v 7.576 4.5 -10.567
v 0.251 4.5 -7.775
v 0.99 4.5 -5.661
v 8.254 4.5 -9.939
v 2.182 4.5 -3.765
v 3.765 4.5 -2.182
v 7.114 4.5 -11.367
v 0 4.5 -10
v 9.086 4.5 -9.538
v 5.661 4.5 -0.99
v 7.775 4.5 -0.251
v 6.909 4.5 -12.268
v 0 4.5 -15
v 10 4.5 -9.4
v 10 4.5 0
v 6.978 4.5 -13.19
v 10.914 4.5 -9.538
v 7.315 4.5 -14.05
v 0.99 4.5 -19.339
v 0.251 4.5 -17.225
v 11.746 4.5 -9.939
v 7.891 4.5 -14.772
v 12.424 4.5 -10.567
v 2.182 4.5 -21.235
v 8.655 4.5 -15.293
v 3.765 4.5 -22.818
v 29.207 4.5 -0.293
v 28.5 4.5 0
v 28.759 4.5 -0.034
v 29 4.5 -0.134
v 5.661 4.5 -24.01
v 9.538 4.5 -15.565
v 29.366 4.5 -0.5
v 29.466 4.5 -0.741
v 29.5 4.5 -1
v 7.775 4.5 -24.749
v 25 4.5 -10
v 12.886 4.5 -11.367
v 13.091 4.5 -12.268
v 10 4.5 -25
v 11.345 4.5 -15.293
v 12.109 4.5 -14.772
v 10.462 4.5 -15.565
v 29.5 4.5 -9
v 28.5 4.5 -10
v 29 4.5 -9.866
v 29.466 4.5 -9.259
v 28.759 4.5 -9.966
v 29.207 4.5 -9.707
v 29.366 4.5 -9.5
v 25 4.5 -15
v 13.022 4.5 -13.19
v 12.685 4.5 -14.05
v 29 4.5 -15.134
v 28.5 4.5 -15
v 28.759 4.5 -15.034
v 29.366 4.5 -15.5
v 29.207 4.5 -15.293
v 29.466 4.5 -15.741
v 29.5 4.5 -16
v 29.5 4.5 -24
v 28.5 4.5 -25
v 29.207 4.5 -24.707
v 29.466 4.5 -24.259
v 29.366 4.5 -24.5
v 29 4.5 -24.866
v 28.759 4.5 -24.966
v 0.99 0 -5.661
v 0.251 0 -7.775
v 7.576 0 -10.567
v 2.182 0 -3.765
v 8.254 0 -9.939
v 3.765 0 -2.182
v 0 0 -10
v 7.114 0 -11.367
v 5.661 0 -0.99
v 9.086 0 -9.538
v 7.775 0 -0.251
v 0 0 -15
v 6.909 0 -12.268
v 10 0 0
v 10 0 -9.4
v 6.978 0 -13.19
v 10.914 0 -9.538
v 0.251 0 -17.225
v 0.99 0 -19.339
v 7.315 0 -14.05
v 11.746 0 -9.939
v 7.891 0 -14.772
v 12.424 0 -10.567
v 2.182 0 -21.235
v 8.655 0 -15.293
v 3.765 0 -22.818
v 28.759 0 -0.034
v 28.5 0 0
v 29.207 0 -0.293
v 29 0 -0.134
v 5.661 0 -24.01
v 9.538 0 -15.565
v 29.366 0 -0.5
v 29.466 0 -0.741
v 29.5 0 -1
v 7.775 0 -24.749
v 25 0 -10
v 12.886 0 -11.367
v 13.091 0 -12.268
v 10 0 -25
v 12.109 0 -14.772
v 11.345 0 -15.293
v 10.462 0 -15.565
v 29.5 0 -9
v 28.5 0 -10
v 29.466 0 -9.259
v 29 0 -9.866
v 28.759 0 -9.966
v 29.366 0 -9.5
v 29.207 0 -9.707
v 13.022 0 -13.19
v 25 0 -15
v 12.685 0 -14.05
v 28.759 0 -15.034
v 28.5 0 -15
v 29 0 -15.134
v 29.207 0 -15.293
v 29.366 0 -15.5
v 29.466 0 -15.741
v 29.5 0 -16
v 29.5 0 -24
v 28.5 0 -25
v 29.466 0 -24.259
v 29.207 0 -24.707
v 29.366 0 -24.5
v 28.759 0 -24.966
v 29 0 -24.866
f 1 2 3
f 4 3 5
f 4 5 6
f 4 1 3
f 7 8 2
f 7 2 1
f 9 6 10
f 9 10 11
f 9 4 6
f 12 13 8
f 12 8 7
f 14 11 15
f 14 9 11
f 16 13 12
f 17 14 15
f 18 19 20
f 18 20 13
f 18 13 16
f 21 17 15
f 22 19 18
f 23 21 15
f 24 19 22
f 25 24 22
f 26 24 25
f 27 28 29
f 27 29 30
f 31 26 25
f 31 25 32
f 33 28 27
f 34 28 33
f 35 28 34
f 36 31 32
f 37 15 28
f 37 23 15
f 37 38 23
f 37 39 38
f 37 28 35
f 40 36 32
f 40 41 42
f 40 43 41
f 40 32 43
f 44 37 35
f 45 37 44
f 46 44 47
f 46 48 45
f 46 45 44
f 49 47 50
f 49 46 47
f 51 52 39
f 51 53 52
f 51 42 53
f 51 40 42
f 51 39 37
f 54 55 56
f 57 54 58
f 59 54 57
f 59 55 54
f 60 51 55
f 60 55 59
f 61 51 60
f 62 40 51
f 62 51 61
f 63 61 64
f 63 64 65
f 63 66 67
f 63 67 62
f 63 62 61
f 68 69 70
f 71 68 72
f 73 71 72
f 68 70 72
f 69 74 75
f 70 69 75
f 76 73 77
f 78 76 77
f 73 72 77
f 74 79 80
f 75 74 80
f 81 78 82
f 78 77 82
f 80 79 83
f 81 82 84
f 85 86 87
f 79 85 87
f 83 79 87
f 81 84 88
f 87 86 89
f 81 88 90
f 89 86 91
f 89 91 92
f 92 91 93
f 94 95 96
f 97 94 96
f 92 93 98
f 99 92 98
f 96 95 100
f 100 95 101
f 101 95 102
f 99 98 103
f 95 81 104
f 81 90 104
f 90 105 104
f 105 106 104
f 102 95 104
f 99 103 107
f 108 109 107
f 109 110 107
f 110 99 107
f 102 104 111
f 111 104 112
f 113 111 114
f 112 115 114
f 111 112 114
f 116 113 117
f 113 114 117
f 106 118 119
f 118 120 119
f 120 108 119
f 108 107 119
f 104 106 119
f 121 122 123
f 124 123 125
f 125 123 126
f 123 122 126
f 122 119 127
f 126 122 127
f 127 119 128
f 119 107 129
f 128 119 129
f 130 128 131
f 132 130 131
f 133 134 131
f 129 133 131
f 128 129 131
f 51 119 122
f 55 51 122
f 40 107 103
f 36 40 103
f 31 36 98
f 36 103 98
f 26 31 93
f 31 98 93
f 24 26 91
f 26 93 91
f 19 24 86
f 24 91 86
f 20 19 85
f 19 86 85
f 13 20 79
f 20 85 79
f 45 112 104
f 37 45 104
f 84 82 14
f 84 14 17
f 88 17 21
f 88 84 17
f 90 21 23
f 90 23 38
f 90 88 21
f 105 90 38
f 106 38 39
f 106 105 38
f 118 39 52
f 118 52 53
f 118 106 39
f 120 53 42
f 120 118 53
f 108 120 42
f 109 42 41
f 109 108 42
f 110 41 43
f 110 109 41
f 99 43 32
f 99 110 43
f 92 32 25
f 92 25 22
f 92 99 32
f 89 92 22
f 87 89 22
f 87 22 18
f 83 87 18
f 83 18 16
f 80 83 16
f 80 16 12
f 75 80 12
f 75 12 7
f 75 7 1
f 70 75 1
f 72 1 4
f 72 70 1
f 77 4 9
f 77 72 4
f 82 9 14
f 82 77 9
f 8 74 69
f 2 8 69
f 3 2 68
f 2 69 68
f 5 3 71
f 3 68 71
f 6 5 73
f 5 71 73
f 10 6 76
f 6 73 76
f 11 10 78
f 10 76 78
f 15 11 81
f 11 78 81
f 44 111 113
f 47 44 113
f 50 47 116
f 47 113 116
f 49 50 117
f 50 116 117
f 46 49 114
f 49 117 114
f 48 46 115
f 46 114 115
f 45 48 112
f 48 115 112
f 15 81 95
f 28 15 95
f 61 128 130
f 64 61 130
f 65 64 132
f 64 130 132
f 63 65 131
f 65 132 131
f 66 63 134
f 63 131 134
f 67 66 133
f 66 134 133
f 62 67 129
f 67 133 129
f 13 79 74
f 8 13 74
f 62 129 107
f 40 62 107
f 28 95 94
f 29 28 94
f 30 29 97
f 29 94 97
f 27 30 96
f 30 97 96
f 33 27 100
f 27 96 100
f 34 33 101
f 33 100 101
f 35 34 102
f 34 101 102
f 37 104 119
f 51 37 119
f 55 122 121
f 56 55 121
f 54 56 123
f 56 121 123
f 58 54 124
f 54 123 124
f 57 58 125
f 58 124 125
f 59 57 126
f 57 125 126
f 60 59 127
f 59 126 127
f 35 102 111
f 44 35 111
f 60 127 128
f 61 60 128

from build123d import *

# Parameters (mm, degrees)
SKETCH1_R           = 3.1
BOSS_EXTRUDE1_DEPTH = 4.5


with BuildPart() as part:
    # Sketch1 → Boss-Extrude1 (new body)
    with BuildSketch(Plane(origin=(0, 0, 0), x_dir=(1, 0, 0), z_dir=(0, 1, 0))):
        with BuildLine():
            Line((10, 0), (25, 0))
            Line((25, 0), (28.5, 0))
            ThreePointArc((28.5, 0), (29.207106781, 0.292893219), (29.5, 1))
            Line((29.5, 1), (29.5, 9))
            ThreePointArc((29.5, 9), (29.207106781, 9.707106781), (28.5, 10))
            Line((28.5, 10), (25, 10))
            Line((25, 10), (25, 15))
            Line((25, 15), (28.5, 15))
            ThreePointArc((28.5, 15), (29.207106781, 15.292893219), (29.5, 16))
            Line((29.5, 16), (29.5, 24))
            ThreePointArc((29.5, 24), (29.207106781, 24.707106781), (28.5, 25))
            Line((28.5, 25), (25, 25))
            Line((25, 25), (10, 25))
            ThreePointArc((10, 25), (2.928932188, 22.071067812), (0, 15))
            Line((0, 15), (0, 10))
            ThreePointArc((0, 10), (2.928932188, 2.928932188), (10, 0))
        make_face()
        with Locations(Location((10, 12.5, 0), (0, 0, 270))):
            Circle(SKETCH1_R, mode=Mode.SUBTRACT)
    extrude(amount=BOSS_EXTRUDE1_DEPTH)


solid = part.part
